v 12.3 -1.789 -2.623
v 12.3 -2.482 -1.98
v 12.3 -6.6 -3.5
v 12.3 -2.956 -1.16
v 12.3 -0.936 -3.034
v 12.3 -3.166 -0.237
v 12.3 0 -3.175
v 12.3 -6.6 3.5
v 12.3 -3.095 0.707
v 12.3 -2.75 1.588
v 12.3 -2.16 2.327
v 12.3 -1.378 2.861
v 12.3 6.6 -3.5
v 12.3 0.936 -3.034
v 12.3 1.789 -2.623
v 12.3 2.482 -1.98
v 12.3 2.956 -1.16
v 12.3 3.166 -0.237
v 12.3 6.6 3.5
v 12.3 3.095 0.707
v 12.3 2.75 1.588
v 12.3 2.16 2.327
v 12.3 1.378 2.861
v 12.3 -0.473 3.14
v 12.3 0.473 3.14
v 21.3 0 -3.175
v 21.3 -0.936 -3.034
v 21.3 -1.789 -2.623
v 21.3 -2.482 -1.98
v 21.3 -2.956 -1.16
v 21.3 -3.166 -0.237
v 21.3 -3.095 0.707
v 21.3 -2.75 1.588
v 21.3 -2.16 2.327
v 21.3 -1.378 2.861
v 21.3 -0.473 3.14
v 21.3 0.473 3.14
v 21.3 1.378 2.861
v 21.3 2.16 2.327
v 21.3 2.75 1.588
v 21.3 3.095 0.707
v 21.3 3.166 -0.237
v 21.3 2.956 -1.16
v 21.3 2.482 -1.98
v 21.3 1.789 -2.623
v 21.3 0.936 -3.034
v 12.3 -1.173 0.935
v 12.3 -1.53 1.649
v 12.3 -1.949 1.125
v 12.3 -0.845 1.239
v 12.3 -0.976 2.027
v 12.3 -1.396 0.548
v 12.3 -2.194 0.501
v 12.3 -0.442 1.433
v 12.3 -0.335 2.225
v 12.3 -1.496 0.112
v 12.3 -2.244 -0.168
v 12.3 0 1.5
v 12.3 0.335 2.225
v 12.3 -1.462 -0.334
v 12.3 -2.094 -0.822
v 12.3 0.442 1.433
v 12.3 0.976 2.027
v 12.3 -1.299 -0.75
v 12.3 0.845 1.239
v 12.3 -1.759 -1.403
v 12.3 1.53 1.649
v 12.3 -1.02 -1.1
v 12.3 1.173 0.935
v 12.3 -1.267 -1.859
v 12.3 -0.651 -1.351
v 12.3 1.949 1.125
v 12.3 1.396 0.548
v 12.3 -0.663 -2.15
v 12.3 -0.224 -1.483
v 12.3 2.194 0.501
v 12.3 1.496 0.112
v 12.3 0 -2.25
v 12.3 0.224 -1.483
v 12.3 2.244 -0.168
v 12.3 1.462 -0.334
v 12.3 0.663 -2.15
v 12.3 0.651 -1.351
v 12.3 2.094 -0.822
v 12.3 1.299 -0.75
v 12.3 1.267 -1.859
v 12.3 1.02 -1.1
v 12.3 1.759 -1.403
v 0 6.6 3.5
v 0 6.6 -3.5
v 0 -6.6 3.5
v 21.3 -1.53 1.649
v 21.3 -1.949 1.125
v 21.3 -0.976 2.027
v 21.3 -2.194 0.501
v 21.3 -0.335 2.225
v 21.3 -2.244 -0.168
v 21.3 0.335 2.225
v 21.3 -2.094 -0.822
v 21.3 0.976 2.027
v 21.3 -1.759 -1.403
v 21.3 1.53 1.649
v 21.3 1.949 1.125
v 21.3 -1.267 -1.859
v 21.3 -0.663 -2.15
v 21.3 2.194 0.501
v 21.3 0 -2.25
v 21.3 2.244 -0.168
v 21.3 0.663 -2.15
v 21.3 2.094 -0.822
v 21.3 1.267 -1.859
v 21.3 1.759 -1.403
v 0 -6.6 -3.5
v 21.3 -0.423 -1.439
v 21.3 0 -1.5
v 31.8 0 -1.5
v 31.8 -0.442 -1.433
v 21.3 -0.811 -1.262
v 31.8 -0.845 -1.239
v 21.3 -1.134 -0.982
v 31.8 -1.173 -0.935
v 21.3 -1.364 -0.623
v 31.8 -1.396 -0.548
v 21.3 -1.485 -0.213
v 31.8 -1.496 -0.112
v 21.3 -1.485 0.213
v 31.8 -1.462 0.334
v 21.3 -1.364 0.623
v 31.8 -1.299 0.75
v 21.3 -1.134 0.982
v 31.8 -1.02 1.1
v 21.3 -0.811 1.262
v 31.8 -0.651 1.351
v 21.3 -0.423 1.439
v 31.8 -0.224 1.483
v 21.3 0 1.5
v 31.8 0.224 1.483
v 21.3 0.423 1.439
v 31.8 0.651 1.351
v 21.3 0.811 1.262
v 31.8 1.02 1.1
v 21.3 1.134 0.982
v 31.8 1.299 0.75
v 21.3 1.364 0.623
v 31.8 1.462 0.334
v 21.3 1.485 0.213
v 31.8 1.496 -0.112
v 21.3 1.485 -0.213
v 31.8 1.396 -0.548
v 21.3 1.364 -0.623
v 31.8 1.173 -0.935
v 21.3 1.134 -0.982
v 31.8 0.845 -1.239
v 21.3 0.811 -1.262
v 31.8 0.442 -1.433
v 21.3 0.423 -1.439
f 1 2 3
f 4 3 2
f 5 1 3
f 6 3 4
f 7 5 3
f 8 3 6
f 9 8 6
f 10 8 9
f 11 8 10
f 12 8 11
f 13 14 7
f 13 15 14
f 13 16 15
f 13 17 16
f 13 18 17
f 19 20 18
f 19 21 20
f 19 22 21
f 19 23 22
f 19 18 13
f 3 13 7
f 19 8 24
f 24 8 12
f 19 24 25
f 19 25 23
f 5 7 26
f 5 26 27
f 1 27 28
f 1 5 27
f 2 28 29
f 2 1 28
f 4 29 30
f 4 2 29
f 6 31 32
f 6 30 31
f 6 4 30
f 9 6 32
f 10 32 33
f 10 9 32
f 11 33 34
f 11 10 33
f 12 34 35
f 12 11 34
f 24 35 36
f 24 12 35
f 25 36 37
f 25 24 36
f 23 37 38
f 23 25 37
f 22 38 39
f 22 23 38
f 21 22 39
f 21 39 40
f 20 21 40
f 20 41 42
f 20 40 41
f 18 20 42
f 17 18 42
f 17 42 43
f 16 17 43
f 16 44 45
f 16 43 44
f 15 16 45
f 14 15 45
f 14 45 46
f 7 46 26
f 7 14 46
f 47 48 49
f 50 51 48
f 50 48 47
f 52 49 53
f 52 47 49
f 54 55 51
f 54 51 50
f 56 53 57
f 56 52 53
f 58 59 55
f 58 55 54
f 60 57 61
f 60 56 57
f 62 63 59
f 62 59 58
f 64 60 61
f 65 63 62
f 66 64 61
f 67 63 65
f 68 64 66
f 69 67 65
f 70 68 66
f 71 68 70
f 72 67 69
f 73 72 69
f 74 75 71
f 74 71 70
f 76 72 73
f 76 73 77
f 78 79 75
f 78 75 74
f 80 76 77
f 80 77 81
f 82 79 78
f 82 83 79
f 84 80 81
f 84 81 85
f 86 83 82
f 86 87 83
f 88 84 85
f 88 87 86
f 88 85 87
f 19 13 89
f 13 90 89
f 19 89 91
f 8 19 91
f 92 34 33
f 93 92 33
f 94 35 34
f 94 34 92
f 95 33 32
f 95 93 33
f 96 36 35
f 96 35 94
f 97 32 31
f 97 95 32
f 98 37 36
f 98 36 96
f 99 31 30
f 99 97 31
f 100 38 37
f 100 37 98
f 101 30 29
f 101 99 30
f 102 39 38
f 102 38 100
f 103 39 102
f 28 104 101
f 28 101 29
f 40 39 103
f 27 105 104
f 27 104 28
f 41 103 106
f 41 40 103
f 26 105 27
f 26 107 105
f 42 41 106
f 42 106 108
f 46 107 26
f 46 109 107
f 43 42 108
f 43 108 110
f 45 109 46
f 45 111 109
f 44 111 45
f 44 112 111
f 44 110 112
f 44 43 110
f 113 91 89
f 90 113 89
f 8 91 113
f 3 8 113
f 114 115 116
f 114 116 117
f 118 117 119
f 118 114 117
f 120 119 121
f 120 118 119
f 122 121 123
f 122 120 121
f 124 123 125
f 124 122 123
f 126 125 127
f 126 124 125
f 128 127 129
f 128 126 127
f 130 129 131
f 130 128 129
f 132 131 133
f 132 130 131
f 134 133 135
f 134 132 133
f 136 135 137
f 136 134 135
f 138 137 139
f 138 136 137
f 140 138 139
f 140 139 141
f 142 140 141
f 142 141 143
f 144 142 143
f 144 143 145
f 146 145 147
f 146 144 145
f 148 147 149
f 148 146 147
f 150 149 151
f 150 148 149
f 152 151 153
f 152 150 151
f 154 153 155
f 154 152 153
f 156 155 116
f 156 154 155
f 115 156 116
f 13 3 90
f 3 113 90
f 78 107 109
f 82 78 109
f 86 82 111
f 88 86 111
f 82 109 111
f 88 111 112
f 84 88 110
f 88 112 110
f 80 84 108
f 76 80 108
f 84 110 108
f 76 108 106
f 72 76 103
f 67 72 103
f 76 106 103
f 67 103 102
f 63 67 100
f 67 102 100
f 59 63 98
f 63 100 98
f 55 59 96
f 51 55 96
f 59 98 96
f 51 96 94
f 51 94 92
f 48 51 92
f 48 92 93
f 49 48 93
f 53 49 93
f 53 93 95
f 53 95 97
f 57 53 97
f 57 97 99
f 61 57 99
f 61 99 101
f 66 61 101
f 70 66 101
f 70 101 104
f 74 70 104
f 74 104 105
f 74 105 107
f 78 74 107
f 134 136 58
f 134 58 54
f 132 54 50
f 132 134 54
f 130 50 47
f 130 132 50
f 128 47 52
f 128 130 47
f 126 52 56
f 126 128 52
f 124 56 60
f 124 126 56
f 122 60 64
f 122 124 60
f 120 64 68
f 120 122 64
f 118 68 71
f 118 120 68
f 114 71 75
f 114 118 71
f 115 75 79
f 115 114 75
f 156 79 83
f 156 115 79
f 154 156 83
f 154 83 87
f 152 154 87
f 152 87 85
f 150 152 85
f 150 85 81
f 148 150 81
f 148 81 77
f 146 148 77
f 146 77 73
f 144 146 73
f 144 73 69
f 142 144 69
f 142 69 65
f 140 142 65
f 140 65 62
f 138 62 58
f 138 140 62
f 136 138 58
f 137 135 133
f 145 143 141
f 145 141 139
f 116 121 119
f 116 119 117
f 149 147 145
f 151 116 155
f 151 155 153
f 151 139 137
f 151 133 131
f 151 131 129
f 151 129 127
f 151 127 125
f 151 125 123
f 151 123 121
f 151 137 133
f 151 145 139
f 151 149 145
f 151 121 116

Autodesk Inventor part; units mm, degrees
ref_plane "YZ Plane" through (0, 0, 0) normal (1, 0, 0) x (0, 1, 0)
ref_plane "XZ Plane" through (0, 0, 0) normal (0, 1, 0) x (-1, 0, 0)
ref_plane "XY Plane" through (0, 0, 0) normal (0, 0, 1) x (1, 0, 0)
sketch "Sketch1" plane through (0, 0, 0) normal (1, 0, 0) x (0, 1, 0)
  line L0 (6.6, 3.5) -> (-6.6, 3.5)
  line L1 (-6.6, 3.5) -> (-6.6, -3.5)
  line L2 (-6.6, -3.5) -> (6.6, -3.5)
  line L3 (6.6, -3.5) -> (6.6, 3.5)
  line L4 (6.6, 3.5) -> (-6.6, -3.5) construction
  line L5 (-6.6, 3.5) -> (6.6, -3.5) construction
  point P0 (0, 0)
  dimension "d0" = 13.2
  dimension "d1" = 7
extrude "Extrusion1" add sketch "Sketch1" along normal blind 12.3
sketch "Sketch2" plane through (12.3, 0, 0) normal (1, 0, 0) x (0, 0, -1)
  circle A0 centre (0, 0) radius 3.175
  dimension "d4" = 6.35
extrude "Extrusion2" add sketch "Sketch2" along normal blind 9
sketch "Sketch3" plane through (21.3, 0, 0) normal (1, 0, 0) x (0, 0, -1)
  circle A0 centre (0, 0) radius 2.25
  dimension "d7" = 4.5
extrude "Extrusion3" cut sketch "Sketch3" against normal blind 9
sketch "Sketch4" plane through (21.3, 0, 0) normal (1, 0, 0) x (0, 0, -1)
  circle A0 centre (0, 0) radius 1.5
  dimension "d10" = 3
extrude "Extrusion4" add sketch "Sketch4" along normal blind 10.5
sketch "Sketch5" plane through (21.3, 0, 0) normal (-1, 0, 0) x (0, 0, 1)
  circle A0 centre (0, 0) radius 1.5 projected
extrude "Extrusion5" add sketch "Sketch5" along normal up to surface (9 mm away)
thread "Thread1" size "1/4-40 UNS" class "2A" standard "ANSI Unified Screw Threads" length 15.103
properties part number "APEM_5236CDB" material "Stainless Steel"
